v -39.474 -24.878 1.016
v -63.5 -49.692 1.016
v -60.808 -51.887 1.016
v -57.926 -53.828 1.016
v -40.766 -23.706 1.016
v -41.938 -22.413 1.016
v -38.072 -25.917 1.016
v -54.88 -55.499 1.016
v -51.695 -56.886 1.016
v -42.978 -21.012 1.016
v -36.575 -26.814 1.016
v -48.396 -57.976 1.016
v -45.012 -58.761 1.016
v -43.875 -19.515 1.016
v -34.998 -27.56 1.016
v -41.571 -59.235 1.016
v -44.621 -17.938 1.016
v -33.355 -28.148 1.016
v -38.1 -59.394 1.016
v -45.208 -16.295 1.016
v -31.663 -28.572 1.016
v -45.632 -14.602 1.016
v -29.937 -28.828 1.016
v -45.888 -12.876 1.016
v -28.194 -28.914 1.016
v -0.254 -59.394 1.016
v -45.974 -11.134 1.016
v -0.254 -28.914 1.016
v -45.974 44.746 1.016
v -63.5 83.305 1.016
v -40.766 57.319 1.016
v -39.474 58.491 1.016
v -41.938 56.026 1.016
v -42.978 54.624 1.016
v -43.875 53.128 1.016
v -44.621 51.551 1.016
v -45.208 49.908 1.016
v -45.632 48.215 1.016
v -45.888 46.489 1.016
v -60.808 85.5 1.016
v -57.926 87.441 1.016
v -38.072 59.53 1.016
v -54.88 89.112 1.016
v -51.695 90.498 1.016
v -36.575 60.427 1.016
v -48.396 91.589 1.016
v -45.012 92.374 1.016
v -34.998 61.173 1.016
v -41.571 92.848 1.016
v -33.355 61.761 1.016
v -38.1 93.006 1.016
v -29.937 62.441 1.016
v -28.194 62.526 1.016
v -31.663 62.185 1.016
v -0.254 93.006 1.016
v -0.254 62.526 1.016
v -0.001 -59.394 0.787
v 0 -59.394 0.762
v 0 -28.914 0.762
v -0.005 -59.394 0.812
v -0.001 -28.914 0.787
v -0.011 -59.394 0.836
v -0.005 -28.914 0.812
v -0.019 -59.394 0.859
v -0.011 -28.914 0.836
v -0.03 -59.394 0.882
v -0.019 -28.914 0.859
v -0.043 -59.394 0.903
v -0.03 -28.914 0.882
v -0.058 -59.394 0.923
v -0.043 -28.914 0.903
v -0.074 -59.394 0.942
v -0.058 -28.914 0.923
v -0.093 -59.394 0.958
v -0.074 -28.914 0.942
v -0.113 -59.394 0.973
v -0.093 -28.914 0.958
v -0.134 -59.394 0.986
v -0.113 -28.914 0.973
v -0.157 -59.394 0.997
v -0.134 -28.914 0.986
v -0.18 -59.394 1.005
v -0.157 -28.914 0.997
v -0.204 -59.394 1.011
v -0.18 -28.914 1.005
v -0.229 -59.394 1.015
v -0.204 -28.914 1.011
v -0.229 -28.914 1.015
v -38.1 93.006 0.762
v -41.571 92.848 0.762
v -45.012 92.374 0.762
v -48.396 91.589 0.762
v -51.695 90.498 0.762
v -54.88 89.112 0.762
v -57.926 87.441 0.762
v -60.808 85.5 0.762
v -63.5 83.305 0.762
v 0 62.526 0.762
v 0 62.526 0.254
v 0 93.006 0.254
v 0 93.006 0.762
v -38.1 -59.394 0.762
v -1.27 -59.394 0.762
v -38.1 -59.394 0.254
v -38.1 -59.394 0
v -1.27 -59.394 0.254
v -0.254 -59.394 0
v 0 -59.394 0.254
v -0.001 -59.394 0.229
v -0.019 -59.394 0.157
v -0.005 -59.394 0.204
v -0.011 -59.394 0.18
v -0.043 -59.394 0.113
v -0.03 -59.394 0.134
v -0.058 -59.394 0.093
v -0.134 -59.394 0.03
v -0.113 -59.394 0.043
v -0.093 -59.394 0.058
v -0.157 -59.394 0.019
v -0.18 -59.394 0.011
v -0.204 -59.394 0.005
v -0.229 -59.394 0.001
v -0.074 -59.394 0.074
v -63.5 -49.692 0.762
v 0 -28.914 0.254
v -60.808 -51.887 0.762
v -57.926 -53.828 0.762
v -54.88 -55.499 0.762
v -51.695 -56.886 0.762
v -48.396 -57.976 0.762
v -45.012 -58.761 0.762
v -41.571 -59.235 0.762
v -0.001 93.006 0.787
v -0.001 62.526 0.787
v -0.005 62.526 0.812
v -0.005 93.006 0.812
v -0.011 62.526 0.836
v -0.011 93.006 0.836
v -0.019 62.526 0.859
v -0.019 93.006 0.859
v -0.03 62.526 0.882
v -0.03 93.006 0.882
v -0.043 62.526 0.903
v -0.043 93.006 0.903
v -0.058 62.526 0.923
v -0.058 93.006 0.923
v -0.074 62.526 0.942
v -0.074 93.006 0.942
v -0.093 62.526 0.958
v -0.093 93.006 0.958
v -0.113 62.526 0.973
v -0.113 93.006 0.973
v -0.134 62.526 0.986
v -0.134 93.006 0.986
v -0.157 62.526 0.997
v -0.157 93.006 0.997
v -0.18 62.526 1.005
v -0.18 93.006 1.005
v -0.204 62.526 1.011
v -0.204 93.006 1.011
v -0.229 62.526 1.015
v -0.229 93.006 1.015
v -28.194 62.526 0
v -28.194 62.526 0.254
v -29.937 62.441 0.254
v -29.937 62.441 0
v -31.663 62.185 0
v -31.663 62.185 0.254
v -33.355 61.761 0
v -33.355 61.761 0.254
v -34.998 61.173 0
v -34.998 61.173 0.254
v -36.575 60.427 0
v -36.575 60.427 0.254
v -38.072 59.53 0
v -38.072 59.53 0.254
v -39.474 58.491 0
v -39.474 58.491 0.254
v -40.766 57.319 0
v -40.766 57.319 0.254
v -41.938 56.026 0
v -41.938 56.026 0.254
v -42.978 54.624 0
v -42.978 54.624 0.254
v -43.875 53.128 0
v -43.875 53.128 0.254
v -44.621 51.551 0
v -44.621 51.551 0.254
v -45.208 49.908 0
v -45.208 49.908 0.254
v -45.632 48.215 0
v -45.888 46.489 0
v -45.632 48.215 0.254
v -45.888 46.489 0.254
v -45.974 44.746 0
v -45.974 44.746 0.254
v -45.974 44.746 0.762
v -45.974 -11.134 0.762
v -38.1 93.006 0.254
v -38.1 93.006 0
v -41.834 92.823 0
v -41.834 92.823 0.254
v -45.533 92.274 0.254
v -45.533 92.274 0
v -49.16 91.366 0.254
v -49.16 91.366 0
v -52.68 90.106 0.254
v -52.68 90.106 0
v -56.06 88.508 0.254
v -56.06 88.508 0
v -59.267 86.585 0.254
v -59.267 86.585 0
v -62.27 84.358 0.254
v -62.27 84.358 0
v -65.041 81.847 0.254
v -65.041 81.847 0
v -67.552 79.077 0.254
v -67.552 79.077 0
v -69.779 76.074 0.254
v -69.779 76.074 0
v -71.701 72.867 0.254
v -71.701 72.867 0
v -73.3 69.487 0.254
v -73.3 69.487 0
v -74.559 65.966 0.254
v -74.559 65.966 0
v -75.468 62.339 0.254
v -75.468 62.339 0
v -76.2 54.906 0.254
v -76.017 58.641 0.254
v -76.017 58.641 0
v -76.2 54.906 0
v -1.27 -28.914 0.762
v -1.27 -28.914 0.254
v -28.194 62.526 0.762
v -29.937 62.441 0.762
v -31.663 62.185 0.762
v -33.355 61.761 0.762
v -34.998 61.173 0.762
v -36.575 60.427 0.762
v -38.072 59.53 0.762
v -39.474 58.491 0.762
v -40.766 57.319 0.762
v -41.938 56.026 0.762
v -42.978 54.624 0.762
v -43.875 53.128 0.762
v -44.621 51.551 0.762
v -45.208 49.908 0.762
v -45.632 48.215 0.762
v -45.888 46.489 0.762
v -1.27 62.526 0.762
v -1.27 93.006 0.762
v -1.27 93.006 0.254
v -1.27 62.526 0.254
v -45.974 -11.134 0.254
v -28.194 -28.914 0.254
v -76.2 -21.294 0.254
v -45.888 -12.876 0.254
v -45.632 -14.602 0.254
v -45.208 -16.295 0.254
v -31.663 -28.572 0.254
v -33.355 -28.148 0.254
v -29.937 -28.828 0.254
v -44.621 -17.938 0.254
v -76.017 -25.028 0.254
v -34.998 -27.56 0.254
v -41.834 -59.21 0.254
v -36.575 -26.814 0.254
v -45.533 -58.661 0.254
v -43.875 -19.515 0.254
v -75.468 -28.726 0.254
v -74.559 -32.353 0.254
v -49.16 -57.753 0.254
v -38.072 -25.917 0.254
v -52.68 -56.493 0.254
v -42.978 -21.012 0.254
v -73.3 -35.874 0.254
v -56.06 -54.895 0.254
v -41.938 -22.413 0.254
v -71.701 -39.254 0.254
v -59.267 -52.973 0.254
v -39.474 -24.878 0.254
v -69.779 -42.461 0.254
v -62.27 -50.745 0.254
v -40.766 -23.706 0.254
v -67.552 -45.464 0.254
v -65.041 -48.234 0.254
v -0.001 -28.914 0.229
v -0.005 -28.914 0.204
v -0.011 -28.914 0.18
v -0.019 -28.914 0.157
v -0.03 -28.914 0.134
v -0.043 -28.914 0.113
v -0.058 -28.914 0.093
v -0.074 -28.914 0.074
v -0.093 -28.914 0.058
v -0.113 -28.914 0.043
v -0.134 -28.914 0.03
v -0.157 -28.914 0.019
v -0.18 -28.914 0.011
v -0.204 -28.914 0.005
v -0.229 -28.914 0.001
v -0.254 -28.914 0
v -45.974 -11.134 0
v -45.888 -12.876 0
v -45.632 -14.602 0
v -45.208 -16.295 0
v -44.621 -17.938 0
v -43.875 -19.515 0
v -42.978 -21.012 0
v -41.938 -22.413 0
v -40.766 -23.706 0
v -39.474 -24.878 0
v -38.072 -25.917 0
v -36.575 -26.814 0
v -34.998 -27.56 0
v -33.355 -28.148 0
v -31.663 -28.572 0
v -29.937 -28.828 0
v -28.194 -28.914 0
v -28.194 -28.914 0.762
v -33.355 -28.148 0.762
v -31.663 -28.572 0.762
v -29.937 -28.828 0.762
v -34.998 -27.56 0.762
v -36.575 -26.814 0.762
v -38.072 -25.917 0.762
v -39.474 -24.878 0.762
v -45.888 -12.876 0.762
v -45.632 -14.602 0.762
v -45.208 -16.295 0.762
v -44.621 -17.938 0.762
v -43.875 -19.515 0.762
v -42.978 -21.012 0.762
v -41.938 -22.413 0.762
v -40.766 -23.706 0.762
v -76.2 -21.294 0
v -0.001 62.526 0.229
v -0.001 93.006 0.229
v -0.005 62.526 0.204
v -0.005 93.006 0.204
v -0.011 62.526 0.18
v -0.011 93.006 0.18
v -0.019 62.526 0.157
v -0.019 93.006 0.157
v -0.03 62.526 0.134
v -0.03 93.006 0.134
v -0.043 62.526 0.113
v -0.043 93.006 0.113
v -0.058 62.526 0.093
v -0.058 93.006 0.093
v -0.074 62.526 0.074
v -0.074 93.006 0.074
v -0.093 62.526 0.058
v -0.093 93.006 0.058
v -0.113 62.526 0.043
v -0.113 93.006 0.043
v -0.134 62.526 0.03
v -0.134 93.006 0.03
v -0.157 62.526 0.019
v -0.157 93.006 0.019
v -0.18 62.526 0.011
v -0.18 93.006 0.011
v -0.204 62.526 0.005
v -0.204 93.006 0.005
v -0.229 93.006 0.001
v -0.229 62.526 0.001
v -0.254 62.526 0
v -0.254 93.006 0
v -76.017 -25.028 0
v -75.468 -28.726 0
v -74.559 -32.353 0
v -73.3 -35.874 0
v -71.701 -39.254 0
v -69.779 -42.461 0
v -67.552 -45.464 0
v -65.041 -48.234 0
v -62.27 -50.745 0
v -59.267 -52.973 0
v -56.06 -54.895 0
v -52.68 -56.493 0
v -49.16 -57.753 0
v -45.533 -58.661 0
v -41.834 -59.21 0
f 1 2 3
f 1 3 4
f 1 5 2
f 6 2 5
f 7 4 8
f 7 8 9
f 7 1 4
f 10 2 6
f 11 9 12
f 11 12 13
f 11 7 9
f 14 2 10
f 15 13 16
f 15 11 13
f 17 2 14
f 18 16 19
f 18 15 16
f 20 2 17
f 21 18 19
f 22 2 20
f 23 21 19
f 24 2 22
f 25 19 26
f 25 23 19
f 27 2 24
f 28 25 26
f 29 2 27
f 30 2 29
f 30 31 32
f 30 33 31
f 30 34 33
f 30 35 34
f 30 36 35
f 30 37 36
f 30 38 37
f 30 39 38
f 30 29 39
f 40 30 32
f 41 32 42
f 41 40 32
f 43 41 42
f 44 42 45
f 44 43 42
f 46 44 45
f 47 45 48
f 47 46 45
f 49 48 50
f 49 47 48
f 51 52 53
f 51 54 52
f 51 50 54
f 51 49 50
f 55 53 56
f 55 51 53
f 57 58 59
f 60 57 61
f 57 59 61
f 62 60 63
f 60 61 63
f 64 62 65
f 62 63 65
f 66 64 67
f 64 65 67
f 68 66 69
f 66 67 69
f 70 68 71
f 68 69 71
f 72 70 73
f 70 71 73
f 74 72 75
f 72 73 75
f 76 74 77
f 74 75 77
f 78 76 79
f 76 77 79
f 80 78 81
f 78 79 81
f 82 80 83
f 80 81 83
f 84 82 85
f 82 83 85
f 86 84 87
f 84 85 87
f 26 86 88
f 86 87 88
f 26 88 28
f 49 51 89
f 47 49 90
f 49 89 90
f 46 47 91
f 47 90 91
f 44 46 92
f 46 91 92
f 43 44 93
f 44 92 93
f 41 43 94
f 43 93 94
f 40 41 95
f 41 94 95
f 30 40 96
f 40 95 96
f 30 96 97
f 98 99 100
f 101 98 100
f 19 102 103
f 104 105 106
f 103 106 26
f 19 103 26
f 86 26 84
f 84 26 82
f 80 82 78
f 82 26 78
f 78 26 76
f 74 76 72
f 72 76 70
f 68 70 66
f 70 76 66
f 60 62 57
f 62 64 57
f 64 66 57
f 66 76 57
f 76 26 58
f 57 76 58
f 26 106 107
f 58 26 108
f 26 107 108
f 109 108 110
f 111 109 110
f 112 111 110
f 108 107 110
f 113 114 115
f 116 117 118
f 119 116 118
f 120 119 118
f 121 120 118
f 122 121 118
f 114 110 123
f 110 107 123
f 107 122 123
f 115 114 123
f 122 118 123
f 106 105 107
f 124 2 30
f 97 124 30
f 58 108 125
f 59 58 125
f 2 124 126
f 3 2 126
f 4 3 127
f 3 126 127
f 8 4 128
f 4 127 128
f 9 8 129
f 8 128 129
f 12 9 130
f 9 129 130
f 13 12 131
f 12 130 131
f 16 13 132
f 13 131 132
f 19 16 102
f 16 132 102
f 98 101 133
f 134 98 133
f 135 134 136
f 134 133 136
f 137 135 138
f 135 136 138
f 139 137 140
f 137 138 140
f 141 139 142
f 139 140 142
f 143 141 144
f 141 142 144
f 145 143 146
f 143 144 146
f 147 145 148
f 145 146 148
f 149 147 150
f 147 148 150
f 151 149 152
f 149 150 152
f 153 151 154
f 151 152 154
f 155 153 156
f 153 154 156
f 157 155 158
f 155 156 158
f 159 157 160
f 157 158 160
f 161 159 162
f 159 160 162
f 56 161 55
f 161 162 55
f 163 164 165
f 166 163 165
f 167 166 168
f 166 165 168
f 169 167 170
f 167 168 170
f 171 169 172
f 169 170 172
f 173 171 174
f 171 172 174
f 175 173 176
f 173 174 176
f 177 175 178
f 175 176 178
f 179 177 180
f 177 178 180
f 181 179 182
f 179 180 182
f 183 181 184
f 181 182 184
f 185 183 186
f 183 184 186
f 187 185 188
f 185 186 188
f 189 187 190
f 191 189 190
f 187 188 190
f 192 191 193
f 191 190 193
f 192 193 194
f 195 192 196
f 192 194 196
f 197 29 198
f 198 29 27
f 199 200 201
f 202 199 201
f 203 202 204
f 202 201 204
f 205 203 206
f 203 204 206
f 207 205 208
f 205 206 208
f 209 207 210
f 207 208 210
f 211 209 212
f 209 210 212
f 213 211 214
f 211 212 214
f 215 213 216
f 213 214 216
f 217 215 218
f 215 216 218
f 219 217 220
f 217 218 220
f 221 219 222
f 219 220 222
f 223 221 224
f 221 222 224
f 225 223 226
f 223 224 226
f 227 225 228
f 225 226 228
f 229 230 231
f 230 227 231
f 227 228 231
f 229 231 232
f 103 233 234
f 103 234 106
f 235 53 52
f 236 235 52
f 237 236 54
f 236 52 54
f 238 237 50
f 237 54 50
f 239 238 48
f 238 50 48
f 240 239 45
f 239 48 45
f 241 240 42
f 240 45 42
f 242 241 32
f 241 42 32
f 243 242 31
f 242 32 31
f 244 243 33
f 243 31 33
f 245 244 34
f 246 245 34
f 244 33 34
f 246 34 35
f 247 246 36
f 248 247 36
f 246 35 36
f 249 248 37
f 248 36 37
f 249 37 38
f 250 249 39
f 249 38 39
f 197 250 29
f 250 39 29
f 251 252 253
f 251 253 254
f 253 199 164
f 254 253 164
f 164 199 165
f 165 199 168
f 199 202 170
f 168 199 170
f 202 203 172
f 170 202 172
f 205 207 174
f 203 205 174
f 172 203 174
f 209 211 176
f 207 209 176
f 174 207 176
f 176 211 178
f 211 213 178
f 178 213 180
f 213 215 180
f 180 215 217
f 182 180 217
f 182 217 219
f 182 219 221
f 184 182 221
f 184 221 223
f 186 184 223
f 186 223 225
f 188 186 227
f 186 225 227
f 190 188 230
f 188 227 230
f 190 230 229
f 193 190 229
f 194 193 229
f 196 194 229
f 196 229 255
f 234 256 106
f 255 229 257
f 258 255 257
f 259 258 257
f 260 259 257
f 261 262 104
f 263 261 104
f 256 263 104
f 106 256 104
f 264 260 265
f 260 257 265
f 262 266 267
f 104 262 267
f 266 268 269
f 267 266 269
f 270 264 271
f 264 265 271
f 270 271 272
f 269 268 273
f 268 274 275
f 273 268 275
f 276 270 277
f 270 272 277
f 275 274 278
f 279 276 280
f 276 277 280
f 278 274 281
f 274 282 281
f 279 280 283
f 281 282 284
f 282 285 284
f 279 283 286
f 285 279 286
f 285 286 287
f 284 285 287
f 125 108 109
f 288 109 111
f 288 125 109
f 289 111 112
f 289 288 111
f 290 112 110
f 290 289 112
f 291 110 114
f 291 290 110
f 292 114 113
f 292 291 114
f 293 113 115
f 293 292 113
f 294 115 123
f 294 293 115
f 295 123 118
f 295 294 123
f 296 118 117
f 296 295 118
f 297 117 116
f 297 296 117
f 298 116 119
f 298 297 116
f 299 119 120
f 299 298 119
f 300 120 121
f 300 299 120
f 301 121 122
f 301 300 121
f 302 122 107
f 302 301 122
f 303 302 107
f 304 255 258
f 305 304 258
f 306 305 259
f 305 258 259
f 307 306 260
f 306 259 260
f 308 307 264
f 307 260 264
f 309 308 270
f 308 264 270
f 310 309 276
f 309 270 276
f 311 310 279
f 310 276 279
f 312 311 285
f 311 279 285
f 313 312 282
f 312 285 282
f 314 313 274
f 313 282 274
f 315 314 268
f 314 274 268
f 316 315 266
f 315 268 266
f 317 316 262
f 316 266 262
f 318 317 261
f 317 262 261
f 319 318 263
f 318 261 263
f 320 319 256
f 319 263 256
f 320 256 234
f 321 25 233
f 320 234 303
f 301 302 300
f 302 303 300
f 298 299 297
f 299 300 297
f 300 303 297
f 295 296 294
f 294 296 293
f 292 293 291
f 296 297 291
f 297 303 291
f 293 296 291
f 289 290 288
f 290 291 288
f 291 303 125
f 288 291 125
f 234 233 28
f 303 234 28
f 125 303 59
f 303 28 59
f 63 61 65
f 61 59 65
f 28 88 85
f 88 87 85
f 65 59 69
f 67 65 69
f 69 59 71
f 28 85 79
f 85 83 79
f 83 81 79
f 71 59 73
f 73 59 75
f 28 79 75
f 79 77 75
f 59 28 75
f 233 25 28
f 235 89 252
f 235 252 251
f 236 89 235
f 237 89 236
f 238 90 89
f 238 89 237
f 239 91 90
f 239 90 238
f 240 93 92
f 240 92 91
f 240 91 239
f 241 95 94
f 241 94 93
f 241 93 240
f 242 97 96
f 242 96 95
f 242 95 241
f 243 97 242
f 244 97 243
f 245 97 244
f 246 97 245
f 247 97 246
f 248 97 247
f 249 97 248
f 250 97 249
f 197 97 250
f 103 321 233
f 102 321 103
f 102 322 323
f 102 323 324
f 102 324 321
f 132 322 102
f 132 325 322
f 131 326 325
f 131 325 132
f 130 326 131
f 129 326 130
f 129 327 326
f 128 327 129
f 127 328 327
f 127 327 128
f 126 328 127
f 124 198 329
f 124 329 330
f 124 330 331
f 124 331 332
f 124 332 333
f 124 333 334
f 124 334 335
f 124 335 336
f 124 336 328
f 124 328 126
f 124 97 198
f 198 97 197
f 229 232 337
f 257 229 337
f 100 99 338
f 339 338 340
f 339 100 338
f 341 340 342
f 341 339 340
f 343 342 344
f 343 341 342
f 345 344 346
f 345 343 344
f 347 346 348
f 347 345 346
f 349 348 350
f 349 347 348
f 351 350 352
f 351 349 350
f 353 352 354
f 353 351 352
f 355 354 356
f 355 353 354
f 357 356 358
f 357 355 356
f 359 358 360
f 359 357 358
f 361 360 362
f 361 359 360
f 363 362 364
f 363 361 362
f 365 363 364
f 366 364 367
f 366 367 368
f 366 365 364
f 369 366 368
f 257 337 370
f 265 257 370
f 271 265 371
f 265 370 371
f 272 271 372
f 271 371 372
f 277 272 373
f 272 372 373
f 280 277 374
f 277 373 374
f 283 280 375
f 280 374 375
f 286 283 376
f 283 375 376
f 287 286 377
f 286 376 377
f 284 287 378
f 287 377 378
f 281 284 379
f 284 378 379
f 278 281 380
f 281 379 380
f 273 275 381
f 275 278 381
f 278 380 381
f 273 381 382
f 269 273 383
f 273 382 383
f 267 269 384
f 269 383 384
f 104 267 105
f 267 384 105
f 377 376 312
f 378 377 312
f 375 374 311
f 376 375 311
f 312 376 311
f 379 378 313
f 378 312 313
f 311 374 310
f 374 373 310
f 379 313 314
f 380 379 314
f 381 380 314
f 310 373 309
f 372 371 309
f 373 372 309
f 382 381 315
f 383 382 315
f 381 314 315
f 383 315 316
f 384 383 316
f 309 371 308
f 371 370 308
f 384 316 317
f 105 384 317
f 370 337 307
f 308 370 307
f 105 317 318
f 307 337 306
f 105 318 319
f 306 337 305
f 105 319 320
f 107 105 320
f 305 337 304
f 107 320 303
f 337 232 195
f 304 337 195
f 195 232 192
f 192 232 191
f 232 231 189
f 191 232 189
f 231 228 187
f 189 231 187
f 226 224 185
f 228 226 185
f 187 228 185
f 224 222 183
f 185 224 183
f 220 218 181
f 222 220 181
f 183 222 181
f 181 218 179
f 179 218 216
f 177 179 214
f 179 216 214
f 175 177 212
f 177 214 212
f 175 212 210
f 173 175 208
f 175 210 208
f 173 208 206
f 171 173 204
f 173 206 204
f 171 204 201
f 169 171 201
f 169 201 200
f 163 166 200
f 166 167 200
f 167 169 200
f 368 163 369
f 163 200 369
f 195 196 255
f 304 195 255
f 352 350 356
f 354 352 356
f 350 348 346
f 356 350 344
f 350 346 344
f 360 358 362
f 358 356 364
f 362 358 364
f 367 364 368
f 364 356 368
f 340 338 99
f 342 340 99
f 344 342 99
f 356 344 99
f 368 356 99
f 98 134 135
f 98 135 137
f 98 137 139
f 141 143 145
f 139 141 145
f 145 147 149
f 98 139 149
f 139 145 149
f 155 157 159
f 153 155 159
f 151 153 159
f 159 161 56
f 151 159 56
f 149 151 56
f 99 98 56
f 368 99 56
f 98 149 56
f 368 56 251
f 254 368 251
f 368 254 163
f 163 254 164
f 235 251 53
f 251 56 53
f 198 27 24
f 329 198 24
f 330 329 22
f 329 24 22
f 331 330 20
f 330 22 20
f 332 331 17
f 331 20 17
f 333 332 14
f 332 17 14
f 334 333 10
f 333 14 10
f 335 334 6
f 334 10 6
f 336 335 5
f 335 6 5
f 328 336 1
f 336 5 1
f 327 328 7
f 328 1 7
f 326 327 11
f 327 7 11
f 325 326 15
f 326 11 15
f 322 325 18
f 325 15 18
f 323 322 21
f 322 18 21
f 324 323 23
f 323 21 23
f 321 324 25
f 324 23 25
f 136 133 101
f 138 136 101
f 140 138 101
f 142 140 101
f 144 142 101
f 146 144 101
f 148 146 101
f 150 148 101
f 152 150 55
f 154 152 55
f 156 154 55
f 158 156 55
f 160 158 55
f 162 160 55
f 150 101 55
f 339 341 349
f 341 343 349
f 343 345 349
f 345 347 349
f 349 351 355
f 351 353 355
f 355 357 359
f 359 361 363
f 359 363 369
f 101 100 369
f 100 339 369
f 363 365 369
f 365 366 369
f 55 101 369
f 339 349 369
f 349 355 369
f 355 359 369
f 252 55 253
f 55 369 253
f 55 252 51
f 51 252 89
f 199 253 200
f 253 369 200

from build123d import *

# Parameters (mm, degrees)
F1_DEPTH = 1.016
F2_W     = 160.02
F2_H     = 0.508
F3_DEPTH = 74.93
F4_W     = 34.701408
F4_H     = 184.597183
F5_DEPTH = 0.508
F6_R     = 0.254
F7_R     = 0.254
F9_DEPTH = 1.017


with BuildPart() as f1:
    # F0 (on Top) → F1 (new body)
    with BuildSketch(Plane.XY):
        with BuildLine():
            Line((0, -59.393544), (0, 93.006456))
            Line((0, 93.006456), (-38.1, 93.006456))
            ThreePointArc((-38.1, 93.006456), (-65.040768, 81.847225), (-76.2, 54.906456))
            Line((-76.2, 54.906456), (-76.2, -21.293544))
            ThreePointArc((-76.2, -21.293544), (-65.040768, -48.234312), (-38.1, -59.393544))
            Line((-38.1, -59.393544), (0, -59.393544))
        make_face()
    extrude(amount=F1_DEPTH)

    # F2 (on face) → F3 (cut)
    with BuildSketch(Plane(origin=(-76.2, 0, 0), x_dir=(0, -1, 0), z_dir=(-1, 0, 0))):
        with Locations((-18.385805, 0.508)):
            Rectangle(F2_W, F2_H)
    extrude(amount=-F3_DEPTH, mode=Mode.SUBTRACT)

    # F4 (on face) → F5 (cut)
    with BuildSketch(Plane.XY.offset(1.016)):
        with Locations((-80.850704, 13.036623)):
            Rectangle(F4_W, F4_H)
    extrude(amount=-F5_DEPTH, mode=Mode.SUBTRACT)

    # F6
    f6_edges = [f1.edges().sort_by_distance(p)[0] for p in [
        (0, 16.806456, 1.016),
    ]]
    fillet(f6_edges, radius=F6_R)

    # F7
    f7_edges = [f1.edges().sort_by_distance(p)[0] for p in [
        (0, 16.806456, 0),
    ]]
    fillet(f7_edges, radius=F7_R)

    # F8 (on face) → F9 (cut, through all)
    with BuildSketch(Plane.XY.offset(1.016)):
        with BuildLine():
            Line((40.75986, 62.526456), (-28.194, 62.526456))
            ThreePointArc((-28.194, 62.526456), (-40.766359, 57.318815), (-45.974, 44.746456))
            Line((-45.974, 44.746456), (-45.974, -11.133544))
            ThreePointArc((-45.974, -11.133544), (-40.766359, -23.705902), (-28.194, -28.913544))
            Line((-28.194, -28.913544), (40.75986, -28.913544))
            Line((40.75986, -28.913544), (40.75986, 62.526456))
        make_face()
    extrude(amount=-F9_DEPTH, mode=Mode.SUBTRACT)


solid = f1.part
